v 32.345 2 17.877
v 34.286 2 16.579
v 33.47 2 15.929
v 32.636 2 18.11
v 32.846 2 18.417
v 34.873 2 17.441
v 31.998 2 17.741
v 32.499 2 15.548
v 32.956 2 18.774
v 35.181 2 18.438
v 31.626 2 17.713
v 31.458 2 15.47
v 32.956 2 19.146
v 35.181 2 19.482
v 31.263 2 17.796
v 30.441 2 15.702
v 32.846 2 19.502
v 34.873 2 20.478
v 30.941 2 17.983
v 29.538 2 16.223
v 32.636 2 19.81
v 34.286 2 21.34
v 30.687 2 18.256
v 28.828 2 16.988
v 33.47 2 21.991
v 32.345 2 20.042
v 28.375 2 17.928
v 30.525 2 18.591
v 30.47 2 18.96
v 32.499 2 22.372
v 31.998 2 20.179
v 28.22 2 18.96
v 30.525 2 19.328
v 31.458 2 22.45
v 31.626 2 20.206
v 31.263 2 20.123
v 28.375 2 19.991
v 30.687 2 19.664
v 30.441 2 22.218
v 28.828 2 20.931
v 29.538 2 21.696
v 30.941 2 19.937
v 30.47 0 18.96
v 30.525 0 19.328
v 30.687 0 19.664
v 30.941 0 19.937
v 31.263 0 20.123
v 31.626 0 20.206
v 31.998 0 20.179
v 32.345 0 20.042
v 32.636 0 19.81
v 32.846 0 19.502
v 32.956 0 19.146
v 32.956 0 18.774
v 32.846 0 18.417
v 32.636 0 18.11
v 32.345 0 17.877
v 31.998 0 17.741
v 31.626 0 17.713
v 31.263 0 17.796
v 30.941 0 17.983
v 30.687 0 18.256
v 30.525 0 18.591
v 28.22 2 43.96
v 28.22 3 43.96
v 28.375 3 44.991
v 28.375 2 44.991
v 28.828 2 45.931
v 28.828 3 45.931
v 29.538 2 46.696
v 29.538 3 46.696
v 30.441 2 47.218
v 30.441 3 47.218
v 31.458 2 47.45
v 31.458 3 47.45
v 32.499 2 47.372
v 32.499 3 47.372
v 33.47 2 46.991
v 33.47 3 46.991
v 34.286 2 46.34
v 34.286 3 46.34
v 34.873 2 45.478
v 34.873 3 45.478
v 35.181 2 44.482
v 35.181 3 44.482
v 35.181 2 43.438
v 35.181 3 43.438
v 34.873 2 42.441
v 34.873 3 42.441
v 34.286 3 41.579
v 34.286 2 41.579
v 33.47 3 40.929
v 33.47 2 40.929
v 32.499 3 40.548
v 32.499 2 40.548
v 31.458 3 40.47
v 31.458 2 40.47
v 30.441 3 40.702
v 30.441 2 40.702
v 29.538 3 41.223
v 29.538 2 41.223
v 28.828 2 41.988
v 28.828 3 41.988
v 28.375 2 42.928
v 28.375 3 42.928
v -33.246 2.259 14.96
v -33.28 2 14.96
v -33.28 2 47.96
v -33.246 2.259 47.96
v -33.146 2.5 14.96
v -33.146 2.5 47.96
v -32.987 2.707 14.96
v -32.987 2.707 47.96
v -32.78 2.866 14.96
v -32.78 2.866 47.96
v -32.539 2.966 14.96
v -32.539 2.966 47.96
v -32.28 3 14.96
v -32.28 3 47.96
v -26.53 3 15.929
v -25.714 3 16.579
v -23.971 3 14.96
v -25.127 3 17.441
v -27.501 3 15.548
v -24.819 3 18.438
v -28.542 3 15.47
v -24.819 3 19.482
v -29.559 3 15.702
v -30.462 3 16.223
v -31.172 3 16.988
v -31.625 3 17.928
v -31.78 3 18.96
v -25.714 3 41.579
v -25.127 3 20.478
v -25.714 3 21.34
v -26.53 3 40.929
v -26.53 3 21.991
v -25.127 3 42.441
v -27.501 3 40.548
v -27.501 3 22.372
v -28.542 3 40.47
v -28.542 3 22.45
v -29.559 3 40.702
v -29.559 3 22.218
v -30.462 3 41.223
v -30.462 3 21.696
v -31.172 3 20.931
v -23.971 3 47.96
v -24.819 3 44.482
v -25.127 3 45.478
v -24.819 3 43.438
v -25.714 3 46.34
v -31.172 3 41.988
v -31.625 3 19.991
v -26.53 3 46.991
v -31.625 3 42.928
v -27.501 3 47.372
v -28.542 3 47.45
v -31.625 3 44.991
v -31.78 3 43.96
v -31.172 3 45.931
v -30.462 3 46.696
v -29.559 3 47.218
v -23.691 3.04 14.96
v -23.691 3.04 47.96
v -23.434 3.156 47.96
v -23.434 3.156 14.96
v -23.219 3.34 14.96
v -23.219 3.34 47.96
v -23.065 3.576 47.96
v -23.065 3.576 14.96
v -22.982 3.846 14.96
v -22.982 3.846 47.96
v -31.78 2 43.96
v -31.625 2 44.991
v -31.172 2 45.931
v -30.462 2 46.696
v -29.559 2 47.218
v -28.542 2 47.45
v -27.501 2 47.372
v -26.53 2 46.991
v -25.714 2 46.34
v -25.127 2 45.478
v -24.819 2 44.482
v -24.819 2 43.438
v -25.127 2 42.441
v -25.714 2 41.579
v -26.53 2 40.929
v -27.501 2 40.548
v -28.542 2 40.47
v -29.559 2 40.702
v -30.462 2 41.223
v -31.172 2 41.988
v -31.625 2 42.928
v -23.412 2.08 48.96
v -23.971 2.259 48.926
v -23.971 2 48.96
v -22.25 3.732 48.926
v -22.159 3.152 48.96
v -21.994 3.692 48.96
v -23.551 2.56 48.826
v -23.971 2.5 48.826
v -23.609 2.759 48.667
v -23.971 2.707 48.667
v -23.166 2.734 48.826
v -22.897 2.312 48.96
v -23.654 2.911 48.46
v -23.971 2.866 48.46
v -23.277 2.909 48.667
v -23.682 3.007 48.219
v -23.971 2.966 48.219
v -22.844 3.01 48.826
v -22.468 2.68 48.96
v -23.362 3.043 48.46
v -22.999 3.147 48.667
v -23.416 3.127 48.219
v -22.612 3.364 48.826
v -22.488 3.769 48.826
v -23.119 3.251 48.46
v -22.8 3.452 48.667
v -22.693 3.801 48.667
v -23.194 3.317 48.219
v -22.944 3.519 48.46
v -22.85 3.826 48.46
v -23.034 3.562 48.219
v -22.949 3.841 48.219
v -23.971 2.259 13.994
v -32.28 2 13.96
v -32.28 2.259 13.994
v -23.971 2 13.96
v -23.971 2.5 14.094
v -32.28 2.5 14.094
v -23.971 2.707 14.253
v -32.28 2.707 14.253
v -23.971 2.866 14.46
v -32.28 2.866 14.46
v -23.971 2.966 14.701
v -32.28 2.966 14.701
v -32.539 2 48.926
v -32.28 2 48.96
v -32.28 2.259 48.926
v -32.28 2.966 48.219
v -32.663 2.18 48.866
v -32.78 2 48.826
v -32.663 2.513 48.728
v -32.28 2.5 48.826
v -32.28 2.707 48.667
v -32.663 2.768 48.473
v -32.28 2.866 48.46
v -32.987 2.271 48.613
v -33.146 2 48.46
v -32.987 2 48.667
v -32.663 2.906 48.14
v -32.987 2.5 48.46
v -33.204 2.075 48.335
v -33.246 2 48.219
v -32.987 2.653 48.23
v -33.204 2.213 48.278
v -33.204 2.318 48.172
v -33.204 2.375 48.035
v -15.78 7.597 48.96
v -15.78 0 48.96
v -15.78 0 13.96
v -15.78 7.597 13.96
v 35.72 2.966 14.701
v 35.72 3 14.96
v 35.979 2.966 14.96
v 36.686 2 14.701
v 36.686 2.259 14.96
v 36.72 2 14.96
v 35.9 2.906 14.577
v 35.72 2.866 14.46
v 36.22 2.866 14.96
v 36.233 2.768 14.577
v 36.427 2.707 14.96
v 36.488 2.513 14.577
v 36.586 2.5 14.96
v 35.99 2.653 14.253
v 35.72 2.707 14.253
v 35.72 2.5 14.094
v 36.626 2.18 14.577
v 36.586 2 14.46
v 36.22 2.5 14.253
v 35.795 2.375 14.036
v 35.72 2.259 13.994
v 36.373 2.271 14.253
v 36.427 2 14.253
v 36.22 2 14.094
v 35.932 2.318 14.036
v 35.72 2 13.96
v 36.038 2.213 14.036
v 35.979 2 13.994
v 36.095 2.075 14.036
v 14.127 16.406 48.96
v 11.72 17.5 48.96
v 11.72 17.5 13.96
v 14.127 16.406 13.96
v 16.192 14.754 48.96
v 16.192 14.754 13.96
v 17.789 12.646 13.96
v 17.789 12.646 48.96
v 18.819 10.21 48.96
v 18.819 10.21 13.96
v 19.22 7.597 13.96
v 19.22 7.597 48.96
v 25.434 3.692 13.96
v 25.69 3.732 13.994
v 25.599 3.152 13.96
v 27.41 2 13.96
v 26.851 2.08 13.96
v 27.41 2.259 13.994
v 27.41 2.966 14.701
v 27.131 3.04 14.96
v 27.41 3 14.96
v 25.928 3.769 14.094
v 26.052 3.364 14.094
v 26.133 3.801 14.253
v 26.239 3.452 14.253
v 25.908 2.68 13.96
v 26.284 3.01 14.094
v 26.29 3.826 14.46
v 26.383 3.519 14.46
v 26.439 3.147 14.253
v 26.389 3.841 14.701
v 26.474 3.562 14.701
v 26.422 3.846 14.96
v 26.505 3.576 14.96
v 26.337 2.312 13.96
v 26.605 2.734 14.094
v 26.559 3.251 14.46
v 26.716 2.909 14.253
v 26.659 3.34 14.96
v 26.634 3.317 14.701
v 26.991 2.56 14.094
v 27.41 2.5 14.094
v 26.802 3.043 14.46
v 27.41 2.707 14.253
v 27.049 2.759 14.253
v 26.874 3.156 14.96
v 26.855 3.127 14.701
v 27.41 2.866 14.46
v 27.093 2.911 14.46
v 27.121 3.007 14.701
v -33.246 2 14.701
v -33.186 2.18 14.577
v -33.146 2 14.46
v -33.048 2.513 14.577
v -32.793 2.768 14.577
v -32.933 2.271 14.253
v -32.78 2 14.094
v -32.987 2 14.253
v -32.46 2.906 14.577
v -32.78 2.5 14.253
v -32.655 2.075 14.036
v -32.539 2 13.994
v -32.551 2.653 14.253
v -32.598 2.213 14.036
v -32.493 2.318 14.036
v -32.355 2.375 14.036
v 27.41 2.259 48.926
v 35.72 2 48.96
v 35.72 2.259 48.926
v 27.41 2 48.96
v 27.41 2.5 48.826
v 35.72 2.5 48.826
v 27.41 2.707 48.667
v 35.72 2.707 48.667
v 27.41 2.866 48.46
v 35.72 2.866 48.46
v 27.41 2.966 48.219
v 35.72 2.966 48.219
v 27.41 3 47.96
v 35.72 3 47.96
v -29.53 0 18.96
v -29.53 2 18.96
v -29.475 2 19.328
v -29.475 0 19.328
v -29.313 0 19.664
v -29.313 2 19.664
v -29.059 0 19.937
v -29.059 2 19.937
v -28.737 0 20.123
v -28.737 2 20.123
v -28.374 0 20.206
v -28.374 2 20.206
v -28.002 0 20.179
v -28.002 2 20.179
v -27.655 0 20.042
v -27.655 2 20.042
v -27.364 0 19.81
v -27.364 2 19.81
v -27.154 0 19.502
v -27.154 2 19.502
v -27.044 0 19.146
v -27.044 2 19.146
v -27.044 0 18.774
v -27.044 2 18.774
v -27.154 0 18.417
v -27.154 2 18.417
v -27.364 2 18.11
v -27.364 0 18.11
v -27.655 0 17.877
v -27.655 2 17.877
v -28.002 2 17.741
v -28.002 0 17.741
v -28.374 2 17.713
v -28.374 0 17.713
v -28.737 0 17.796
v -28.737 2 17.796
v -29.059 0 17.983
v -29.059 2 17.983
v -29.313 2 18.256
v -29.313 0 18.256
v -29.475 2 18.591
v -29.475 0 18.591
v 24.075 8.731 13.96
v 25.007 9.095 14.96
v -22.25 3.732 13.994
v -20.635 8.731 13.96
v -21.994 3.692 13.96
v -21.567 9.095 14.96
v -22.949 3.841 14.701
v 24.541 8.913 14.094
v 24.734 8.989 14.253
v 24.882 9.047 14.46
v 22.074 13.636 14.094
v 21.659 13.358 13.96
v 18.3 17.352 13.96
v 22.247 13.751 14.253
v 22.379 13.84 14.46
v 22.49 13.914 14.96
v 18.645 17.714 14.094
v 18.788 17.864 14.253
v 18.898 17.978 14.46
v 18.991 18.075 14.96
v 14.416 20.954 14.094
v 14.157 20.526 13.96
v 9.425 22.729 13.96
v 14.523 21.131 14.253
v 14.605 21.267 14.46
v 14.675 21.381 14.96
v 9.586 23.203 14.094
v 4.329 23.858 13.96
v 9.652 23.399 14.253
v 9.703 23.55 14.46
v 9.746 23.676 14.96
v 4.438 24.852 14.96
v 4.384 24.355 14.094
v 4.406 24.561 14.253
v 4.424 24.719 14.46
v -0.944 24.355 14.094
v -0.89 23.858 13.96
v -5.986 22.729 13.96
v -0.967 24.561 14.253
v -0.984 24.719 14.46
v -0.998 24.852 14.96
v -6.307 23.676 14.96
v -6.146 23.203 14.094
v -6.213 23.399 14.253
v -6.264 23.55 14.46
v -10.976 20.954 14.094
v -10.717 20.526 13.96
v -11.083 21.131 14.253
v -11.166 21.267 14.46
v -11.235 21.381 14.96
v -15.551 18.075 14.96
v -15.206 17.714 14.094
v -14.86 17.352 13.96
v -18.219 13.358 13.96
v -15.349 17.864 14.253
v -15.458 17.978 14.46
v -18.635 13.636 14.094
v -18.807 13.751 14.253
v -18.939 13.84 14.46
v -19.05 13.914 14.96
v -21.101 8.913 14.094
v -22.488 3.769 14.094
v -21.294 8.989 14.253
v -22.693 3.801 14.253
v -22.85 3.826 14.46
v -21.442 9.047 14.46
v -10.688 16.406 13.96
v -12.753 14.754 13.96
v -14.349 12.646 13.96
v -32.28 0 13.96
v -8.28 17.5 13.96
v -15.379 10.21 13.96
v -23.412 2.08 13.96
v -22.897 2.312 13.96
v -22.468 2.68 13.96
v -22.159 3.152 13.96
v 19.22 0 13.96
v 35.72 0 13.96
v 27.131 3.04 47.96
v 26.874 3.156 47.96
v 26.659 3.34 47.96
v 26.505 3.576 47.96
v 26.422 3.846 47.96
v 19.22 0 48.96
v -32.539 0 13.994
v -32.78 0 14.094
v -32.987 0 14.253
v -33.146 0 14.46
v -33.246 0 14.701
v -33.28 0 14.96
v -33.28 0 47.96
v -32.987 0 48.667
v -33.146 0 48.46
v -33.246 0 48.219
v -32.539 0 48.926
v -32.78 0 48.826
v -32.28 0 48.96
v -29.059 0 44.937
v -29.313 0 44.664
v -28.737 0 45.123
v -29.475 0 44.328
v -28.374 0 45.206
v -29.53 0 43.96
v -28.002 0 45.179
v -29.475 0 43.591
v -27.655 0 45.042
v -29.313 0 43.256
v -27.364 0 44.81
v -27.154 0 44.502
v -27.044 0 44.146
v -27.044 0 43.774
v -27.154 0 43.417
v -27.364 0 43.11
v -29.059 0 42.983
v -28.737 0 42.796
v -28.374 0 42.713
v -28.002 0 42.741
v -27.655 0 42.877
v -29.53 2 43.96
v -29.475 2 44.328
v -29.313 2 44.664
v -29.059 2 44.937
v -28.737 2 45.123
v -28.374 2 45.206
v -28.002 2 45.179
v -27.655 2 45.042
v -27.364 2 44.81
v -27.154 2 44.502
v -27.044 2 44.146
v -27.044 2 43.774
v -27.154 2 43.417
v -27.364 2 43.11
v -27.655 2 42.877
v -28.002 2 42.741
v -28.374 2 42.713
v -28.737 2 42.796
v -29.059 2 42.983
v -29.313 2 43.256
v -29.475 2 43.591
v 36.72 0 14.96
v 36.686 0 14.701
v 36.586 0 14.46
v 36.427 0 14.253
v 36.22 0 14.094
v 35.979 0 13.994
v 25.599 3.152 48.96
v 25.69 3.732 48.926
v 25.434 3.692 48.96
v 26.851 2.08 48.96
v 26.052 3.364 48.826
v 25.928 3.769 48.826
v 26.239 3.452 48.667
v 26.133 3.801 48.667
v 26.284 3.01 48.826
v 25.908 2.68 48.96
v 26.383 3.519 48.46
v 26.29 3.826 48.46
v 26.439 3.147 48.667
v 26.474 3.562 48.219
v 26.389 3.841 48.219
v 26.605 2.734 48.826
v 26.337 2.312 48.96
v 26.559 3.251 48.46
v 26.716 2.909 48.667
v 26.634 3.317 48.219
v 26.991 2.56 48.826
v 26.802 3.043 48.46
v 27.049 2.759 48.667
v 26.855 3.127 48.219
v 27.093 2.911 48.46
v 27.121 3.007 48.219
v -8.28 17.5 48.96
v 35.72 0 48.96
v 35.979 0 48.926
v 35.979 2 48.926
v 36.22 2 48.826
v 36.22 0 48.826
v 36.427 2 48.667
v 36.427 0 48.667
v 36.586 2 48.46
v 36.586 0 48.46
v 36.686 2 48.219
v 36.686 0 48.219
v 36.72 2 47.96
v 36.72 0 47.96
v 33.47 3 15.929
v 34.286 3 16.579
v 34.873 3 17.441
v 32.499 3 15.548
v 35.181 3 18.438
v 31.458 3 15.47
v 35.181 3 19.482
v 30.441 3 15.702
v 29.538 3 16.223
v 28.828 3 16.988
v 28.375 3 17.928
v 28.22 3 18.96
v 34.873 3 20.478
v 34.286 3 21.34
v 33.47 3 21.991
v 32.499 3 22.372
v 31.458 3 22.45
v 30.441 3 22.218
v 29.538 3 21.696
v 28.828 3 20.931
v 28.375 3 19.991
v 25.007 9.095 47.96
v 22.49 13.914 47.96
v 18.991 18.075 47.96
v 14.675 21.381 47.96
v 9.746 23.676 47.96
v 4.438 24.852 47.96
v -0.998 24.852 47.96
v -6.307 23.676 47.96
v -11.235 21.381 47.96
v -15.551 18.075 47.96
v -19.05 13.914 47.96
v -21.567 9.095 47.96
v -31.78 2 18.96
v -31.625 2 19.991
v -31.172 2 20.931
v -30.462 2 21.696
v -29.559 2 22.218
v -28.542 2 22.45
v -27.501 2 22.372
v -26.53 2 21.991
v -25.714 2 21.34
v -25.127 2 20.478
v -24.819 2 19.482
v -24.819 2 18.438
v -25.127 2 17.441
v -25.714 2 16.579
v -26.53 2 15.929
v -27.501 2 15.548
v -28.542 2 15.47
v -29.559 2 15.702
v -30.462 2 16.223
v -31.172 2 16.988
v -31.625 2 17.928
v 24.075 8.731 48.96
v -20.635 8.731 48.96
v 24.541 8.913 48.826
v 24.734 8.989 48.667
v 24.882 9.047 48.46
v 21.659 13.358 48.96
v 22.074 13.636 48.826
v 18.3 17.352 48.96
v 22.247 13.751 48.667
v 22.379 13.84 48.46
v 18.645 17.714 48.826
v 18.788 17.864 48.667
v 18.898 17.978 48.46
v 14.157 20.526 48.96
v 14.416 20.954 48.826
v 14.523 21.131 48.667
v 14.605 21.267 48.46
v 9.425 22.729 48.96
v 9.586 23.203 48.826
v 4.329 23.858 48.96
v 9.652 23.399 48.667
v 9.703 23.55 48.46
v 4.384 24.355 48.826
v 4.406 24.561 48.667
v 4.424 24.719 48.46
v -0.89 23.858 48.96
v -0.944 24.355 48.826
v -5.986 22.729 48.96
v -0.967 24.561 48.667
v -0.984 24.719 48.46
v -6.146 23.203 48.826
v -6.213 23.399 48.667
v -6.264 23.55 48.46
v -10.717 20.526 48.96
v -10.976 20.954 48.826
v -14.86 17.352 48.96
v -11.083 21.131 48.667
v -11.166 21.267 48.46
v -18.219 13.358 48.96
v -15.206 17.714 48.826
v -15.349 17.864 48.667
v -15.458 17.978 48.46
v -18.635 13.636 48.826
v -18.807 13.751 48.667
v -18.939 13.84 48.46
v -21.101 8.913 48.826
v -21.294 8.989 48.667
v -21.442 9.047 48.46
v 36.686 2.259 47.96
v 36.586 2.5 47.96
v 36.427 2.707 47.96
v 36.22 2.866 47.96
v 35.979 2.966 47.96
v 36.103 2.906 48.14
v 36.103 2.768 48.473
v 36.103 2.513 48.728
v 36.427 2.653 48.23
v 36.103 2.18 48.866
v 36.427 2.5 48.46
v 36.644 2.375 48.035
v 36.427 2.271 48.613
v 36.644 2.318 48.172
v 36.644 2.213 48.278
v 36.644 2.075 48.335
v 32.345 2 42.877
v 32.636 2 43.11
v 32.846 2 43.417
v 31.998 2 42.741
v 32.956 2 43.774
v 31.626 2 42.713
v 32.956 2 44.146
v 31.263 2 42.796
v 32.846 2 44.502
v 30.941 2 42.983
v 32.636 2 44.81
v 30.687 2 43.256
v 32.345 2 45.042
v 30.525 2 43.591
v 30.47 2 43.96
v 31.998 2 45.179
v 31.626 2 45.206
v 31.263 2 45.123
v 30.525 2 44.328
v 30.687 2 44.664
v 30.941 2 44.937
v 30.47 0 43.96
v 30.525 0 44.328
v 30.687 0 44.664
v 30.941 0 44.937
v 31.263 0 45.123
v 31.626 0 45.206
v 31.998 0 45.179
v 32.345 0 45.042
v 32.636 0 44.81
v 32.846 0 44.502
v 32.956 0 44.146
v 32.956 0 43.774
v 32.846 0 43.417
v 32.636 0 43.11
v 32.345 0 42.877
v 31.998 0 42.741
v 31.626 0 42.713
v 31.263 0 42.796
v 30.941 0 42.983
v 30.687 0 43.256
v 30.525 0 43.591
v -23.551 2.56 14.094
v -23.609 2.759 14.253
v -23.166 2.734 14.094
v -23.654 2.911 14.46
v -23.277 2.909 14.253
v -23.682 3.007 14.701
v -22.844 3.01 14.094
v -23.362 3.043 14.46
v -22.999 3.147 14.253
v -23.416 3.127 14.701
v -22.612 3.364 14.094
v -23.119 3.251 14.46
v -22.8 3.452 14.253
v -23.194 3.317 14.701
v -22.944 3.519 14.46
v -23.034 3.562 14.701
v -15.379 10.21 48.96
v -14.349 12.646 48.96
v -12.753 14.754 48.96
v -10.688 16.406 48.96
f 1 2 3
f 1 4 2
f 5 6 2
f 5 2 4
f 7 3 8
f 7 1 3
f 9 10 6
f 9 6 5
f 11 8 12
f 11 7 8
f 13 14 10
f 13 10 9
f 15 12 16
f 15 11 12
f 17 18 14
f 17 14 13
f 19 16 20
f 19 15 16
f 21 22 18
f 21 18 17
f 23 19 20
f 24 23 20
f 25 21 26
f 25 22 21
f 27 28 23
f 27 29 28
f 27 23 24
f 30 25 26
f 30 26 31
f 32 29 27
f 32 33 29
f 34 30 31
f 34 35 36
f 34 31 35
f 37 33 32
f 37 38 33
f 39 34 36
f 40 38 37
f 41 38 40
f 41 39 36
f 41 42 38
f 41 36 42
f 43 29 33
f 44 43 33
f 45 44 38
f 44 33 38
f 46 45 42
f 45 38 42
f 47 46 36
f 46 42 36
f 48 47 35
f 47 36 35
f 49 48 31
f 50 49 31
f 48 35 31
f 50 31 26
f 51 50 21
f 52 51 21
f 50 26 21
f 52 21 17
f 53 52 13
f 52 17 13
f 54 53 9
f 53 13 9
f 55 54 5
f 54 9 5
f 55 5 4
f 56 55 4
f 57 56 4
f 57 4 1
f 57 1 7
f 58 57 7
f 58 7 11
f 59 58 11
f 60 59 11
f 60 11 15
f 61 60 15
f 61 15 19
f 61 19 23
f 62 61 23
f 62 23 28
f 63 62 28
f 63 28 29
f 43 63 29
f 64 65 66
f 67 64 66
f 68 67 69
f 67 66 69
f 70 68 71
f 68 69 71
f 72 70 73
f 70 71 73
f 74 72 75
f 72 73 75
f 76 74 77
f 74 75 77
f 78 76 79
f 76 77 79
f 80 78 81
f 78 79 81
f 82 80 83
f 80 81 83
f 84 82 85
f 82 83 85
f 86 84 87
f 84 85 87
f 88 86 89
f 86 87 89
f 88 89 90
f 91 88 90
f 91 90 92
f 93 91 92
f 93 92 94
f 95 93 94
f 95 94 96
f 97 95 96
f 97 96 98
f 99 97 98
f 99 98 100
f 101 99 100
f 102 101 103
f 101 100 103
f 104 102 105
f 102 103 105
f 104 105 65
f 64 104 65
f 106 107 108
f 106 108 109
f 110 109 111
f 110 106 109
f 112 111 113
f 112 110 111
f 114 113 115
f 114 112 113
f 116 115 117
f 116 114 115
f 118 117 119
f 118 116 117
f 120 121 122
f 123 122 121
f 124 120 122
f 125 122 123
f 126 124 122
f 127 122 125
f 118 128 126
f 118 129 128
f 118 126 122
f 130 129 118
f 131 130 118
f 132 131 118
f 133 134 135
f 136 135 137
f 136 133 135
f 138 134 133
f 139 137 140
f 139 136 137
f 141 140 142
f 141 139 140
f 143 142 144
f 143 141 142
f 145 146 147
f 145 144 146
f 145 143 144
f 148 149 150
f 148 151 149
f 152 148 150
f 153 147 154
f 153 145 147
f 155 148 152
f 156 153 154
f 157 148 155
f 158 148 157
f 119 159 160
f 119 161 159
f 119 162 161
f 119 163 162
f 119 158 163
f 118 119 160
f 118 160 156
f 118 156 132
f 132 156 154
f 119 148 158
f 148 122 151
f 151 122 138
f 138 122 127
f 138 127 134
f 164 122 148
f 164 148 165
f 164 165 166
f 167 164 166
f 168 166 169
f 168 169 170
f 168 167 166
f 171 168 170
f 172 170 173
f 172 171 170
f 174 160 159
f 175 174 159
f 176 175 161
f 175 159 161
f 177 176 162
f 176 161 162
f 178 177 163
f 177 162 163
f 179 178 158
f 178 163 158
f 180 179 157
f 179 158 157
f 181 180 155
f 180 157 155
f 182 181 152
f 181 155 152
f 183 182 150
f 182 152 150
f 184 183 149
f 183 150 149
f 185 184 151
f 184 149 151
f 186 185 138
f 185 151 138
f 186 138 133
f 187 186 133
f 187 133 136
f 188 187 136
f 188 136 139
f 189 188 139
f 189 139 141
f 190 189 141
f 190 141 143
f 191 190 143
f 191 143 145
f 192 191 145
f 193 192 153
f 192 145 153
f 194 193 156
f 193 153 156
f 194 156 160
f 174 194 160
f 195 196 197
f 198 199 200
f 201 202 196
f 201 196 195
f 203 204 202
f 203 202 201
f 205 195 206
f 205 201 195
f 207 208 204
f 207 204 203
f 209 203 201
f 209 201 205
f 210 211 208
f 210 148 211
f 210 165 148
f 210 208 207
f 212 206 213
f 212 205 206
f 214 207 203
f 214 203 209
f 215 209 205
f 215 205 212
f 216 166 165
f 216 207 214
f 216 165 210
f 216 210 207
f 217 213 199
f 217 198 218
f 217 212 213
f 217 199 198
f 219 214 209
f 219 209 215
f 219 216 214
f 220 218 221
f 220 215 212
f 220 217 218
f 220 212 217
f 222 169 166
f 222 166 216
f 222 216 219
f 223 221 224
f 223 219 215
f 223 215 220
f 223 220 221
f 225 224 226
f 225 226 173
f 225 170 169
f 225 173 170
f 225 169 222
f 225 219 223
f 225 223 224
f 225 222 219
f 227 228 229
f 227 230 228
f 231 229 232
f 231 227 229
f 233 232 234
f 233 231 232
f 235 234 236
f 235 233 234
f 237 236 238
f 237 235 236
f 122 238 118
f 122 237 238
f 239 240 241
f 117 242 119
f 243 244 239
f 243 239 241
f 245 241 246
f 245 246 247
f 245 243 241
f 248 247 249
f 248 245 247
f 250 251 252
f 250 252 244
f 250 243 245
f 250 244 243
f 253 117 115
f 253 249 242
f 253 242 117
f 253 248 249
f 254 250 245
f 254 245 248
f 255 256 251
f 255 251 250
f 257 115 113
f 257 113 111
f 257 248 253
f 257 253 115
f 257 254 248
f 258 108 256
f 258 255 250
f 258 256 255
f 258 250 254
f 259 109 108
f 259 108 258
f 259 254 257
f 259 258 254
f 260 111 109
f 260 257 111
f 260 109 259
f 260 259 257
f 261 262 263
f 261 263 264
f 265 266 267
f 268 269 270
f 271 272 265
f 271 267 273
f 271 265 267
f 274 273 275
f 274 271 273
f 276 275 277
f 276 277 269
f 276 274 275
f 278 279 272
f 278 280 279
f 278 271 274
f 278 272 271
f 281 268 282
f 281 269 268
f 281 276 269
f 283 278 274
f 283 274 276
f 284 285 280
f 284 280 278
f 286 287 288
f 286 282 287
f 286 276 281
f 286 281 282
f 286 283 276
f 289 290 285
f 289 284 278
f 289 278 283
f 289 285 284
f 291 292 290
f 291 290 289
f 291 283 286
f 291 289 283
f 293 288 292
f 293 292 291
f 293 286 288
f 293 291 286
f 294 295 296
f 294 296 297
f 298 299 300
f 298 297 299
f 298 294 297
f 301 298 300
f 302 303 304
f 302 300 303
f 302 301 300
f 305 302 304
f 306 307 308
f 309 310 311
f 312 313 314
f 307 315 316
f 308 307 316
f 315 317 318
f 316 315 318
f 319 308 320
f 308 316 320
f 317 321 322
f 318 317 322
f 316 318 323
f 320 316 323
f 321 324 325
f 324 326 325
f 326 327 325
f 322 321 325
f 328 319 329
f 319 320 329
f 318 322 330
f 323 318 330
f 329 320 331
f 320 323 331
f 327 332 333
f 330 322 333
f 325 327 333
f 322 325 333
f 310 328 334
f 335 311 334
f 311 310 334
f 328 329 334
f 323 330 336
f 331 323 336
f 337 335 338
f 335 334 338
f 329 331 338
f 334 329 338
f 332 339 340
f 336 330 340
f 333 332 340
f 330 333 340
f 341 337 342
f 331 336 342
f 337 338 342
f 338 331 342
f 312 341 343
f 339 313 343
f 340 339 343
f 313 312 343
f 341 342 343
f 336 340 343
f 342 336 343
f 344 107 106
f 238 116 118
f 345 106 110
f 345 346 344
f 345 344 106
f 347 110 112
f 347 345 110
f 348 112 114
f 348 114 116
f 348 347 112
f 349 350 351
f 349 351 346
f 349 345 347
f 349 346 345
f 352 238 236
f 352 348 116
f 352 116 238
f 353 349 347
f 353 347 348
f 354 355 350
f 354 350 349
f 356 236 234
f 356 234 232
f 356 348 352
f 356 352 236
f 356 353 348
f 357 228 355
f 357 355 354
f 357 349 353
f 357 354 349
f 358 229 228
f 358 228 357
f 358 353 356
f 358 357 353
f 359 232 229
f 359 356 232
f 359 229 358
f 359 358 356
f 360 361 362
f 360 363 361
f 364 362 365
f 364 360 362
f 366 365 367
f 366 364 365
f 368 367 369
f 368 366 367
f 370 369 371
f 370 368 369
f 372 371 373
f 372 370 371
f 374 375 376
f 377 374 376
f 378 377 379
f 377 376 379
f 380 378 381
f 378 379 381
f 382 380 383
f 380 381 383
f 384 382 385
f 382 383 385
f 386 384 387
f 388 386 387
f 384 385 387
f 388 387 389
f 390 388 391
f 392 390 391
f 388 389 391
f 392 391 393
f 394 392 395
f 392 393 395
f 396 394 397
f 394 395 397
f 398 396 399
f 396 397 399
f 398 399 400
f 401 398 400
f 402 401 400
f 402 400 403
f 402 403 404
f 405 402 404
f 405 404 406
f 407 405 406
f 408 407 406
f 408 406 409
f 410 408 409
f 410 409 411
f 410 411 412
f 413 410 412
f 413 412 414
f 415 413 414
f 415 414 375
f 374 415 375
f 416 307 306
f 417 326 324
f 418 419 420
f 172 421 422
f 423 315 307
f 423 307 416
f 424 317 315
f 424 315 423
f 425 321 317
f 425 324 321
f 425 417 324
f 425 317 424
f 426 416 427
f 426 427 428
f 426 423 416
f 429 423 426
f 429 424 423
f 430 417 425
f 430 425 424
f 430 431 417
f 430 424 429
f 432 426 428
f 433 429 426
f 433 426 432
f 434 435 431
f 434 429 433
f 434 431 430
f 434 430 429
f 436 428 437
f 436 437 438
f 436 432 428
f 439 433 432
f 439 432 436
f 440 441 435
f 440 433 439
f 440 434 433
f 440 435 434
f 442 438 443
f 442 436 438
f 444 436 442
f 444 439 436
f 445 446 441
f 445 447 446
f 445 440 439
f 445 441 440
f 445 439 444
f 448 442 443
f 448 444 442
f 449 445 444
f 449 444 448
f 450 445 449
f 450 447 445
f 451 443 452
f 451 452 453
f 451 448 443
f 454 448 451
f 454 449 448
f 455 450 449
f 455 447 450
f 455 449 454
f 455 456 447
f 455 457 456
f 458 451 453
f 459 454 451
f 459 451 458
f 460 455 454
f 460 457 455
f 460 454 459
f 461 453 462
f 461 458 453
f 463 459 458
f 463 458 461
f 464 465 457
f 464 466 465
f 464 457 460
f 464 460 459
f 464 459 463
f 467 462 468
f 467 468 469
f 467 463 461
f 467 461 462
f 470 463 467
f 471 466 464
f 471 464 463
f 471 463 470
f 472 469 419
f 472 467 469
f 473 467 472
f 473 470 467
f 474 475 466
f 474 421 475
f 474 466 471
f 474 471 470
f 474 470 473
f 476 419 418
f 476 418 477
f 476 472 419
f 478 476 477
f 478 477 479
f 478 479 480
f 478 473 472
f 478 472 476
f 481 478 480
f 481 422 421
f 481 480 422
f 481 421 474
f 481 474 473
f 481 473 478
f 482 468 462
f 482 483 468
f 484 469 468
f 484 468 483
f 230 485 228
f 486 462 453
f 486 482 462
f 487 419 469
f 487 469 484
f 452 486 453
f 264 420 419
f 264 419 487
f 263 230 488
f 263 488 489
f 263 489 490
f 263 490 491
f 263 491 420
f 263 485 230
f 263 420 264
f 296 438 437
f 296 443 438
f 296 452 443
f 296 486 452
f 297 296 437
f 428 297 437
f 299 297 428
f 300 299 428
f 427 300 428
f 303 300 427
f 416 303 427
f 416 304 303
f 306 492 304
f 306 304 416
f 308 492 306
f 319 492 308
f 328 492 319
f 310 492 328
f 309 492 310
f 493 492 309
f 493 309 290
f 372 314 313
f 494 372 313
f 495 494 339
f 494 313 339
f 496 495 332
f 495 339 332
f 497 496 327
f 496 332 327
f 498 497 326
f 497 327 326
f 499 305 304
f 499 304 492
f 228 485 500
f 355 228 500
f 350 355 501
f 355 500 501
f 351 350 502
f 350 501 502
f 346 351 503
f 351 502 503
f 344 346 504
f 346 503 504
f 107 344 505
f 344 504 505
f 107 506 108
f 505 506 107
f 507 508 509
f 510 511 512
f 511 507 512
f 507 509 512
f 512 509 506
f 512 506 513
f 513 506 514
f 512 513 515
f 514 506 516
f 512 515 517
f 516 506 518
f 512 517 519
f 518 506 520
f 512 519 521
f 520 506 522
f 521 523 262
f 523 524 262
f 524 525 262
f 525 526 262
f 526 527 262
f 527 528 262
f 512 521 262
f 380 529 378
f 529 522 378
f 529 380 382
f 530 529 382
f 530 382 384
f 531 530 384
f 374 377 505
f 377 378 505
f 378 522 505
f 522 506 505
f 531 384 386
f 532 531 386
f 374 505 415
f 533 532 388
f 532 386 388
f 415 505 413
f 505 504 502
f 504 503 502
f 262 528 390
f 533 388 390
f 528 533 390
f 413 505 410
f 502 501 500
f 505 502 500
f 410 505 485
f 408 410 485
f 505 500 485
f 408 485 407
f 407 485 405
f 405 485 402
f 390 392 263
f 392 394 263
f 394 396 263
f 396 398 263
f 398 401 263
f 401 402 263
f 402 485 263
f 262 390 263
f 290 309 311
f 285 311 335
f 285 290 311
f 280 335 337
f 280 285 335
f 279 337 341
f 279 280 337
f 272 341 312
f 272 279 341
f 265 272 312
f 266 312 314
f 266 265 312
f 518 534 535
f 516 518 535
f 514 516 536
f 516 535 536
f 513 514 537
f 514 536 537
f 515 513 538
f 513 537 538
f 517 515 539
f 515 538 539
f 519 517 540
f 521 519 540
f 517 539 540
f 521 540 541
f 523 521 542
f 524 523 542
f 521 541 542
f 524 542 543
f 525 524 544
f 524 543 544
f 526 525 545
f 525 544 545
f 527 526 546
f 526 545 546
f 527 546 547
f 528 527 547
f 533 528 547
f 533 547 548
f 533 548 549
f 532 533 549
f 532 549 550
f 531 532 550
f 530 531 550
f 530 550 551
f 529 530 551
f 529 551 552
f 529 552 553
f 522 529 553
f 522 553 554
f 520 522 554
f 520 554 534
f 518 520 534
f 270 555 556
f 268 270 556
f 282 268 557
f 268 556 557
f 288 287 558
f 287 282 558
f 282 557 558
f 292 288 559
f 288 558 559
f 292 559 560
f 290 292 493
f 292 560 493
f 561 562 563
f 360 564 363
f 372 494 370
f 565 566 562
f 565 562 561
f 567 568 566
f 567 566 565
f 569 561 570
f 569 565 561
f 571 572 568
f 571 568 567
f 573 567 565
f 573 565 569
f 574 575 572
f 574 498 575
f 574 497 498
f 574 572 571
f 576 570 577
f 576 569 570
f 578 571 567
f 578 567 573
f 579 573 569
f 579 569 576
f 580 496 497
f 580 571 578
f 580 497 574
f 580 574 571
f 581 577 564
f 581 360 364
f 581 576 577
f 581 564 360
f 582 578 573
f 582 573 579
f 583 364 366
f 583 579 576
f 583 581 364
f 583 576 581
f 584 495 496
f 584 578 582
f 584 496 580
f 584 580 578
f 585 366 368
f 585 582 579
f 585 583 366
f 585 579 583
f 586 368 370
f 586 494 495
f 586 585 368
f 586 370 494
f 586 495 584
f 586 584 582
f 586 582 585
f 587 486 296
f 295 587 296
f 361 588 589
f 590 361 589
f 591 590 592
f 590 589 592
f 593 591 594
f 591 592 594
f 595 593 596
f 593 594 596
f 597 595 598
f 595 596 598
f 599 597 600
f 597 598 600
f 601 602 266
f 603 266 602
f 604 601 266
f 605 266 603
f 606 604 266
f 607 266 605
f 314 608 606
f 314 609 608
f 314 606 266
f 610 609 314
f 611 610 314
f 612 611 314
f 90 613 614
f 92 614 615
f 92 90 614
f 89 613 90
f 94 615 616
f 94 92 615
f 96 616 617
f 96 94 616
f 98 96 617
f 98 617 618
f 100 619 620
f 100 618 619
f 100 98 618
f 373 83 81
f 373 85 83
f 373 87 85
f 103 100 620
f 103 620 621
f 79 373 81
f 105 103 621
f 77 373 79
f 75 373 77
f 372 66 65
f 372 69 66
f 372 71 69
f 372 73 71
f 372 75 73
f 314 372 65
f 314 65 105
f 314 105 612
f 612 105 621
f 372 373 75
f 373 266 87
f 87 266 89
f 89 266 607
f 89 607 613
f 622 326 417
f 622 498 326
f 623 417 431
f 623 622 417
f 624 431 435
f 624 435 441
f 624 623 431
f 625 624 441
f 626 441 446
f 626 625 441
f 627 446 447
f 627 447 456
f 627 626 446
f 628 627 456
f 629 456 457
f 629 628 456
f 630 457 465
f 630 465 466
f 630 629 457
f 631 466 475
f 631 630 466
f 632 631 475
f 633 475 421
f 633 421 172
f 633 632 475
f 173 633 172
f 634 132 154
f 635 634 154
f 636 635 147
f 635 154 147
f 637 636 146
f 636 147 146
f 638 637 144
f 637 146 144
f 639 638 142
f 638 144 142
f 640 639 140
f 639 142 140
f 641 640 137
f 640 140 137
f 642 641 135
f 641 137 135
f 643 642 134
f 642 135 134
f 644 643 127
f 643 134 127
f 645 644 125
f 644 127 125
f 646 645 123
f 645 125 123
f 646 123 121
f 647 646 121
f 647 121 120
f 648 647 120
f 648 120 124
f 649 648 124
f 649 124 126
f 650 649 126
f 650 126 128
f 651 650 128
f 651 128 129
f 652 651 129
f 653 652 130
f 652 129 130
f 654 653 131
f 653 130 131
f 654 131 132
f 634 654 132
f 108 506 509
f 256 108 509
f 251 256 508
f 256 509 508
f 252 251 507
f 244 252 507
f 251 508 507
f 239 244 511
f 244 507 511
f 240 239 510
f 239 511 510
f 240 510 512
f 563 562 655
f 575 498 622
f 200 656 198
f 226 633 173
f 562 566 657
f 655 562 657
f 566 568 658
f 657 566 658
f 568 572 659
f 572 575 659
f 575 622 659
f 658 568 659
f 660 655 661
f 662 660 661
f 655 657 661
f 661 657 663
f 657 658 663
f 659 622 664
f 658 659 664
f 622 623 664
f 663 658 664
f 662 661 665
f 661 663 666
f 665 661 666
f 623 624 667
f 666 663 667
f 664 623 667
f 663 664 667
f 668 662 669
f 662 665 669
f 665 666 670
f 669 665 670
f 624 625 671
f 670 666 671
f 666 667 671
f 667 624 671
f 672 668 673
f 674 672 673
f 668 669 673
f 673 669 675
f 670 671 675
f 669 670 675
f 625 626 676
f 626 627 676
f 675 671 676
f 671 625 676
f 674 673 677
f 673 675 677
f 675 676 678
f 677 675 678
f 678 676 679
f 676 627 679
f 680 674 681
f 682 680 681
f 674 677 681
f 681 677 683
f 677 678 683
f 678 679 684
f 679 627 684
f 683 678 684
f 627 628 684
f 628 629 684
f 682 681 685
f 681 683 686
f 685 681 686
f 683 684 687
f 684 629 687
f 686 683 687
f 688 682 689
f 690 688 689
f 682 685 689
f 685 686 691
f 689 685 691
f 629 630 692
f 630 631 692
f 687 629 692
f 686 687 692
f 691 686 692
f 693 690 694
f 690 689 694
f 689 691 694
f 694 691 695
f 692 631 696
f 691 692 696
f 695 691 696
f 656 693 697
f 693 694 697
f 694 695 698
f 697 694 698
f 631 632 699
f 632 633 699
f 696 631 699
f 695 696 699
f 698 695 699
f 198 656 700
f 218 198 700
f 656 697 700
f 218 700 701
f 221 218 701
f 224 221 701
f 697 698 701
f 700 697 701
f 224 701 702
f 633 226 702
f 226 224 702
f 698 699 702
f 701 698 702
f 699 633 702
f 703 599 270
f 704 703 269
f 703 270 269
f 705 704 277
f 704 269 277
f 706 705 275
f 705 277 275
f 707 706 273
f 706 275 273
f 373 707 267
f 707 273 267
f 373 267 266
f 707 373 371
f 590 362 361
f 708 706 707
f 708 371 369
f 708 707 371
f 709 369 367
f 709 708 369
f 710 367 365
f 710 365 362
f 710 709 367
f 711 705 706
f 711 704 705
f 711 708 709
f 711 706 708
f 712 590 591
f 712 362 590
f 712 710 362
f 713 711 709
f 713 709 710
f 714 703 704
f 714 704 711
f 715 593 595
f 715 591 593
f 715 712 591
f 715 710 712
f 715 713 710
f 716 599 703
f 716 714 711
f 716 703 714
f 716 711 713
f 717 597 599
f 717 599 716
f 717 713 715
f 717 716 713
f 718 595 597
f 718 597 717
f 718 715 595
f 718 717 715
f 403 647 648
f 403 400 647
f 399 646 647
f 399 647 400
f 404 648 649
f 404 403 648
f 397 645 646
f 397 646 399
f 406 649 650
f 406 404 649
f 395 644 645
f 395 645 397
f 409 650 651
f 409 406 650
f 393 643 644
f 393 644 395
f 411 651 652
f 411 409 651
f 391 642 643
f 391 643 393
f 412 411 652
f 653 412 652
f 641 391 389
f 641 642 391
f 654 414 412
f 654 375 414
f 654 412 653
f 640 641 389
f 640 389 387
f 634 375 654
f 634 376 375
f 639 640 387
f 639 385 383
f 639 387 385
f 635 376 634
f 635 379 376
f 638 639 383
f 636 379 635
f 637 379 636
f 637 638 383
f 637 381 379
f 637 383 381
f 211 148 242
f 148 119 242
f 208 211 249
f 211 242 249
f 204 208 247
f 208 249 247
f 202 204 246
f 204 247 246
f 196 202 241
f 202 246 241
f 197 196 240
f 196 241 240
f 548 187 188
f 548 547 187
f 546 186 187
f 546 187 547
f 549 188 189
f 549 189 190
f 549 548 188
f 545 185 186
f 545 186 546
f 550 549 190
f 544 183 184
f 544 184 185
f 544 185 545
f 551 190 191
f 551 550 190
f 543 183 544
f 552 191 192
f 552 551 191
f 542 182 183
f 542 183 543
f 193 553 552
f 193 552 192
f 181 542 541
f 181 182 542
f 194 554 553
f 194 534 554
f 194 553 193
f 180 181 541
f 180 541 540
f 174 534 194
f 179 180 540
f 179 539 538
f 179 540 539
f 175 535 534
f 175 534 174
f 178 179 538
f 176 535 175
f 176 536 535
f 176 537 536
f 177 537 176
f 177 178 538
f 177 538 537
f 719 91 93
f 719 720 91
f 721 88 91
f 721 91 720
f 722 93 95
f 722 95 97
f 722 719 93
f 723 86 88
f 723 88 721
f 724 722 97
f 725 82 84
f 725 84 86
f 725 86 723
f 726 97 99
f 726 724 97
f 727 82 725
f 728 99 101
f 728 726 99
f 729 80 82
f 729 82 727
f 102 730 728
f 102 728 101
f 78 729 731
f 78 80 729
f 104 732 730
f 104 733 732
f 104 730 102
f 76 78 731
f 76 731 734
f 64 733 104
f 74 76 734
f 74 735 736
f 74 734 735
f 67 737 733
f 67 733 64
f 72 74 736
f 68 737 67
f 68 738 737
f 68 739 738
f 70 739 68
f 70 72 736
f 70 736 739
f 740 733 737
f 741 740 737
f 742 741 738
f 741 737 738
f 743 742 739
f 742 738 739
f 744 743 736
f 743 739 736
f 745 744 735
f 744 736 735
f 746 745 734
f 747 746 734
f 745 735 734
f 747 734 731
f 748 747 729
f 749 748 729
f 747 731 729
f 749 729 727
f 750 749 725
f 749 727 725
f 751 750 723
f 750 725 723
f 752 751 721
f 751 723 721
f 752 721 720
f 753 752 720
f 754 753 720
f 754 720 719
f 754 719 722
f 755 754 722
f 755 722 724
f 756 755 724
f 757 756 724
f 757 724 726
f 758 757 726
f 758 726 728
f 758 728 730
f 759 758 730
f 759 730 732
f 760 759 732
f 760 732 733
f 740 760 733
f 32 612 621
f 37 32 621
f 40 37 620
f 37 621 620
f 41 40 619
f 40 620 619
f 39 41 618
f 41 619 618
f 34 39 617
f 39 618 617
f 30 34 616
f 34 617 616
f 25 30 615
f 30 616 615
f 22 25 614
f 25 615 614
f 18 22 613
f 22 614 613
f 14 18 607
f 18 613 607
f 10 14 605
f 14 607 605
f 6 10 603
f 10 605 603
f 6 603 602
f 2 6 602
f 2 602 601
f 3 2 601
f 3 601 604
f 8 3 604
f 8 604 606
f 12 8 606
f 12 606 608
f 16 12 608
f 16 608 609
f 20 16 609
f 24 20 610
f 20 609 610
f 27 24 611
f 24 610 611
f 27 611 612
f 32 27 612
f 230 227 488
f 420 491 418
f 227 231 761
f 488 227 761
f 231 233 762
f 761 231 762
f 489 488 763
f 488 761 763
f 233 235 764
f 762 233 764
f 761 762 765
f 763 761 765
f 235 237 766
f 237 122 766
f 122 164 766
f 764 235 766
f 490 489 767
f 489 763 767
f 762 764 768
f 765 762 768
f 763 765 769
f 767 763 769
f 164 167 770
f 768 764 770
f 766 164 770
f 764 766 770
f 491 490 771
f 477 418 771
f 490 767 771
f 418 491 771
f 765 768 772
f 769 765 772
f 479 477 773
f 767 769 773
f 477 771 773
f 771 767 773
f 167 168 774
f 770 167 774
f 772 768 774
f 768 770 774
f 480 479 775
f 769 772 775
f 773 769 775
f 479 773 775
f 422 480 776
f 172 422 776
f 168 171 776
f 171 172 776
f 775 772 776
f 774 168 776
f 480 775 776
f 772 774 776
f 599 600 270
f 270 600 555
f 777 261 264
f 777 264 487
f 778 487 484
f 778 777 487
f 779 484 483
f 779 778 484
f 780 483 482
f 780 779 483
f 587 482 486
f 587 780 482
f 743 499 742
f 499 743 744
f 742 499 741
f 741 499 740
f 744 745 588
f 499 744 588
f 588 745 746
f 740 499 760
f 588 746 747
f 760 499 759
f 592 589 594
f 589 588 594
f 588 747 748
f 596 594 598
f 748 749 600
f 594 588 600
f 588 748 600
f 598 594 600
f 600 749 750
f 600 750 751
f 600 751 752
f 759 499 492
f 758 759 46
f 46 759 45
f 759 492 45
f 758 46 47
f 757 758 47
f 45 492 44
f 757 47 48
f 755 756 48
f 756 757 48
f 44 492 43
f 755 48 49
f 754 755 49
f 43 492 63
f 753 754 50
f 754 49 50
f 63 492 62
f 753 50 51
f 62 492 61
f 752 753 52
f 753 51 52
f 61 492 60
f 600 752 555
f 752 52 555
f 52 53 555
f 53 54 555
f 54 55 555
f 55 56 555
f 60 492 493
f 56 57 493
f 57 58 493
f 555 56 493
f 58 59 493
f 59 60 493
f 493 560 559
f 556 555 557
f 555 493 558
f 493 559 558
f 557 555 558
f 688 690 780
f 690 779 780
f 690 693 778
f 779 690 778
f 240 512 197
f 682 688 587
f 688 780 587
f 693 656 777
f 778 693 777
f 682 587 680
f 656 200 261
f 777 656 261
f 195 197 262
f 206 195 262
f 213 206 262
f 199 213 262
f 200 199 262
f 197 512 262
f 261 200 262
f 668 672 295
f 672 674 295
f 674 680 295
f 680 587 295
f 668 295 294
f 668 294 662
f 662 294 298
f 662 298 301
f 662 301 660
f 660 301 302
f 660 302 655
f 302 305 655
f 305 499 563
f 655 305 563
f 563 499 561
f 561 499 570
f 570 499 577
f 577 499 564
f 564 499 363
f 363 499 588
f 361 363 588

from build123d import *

# Parameters (mm, degrees)
CROQUIS1_W              = 70
CROQUIS1_H              = 35
SALIENTE_EXTRUIR1_DEPTH = 30
CORTAR_EXTRUIR1_DEPTH   = 310
CORTAR_EXTRUIR2_DEPTH   = 310
CROQUIS4_R              = 3.5
CORTAR_EXTRUIR3_DEPTH   = 1
REDONDEO1_R             = 1
REDONDEO2_R             = 1
CROQUIS5_R              = 1.25
CORTAR_EXTRUIR4_DEPTH   = 10


with BuildPart() as part:
    # Croquis1 → Saliente-Extruir1 (new body)
    with BuildSketch(Plane(origin=(0, 0, 0), x_dir=(1, 0, 0), z_dir=(0, 1, 0))):
        with Locations((1.719890136, -31.459853515)):
            Rectangle(CROQUIS1_W, CROQUIS1_H)
    extrude(amount=SALIENTE_EXTRUIR1_DEPTH)

    # Croquis2 → Cortar-Extruir1 (cut)
    with BuildSketch(Plane.XY.offset(48.959853515)):
        with BuildLine():
            Line((-15.780109864, 0), (-15.780109864, 7.596564782))
            ThreePointArc((-15.780109864, 7.596564782), (-13.616336365, 13.749552304), (-8.280109864, 17.5))
            Line((-8.280109864, 17.5), (11.719890136, 17.5))
            ThreePointArc((11.719890136, 17.5), (17.0561195, 13.749554472), (19.219890136, 7.596564782))
            Line((19.219890136, 7.596564782), (19.219890136, 0))
            ThreePointArc((19.219890136, 0), (1.719890136, -17.5), (-15.780109864, 0))
        make_face()
    extrude(amount=-CORTAR_EXTRUIR1_DEPTH, mode=Mode.SUBTRACT)

    # Croquis3 → Cortar-Extruir2 (cut)
    with BuildSketch(Plane.XY.offset(48.959853515)):
        with BuildLine():
            Line((-33.280109864, 30), (36.719890136, 30))
            Line((36.719890136, 30), (36.719890136, 3))
            Line((36.719890136, 3), (26.539237428, 3))
            ThreePointArc((26.539237428, 3), (1.719890136, 25), (-23.099457156, 3))
            Line((-23.099457156, 3), (-33.280109864, 3))
            Line((-33.280109864, 3), (-33.280109864, 30))
        make_face()
    extrude(amount=-CORTAR_EXTRUIR2_DEPTH, mode=Mode.SUBTRACT)

    # Croquis4 → Cortar-Extruir3 (cut)
    with BuildSketch(Plane(origin=(0, 3, 0), x_dir=(1, 0, 0), z_dir=(0, 1, 0))):
        with Locations(Location((-28.280109864, -18.959853515, 0), (0, 0, 180))):
            Circle(CROQUIS4_R)
        with Locations(Location((-28.280109864, -43.959853515, 0), (0, 0, 180))):
            Circle(CROQUIS4_R)
        with Locations(Location((31.719890136, -18.959853515, 0), (0, 0, 180))):
            Circle(CROQUIS4_R)
        with Locations(Location((31.719890136, -43.959853515, 0), (0, 0, 180))):
            Circle(CROQUIS4_R)
    extrude(amount=-CORTAR_EXTRUIR3_DEPTH, mode=Mode.SUBTRACT)

    # Redondeo1
    redondeo1_edges = [part.edges().sort_by_distance(p)[0] for p in [
        (-28.18978351, 3, 13.959853515),
        (1.719890136, 25, 13.959853515),
        (31.629563782, 3, 13.959853515),
        (36.719890136, 3, 31.459853515),
        (26.539237428, 3, 31.459853515),
        (-23.099457156, 3, 31.459853515),
        (-33.280109864, 3, 31.459853515),
        (-28.18978351, 3, 48.959853515),
        (1.719890136, 25, 48.959853515),
        (31.629563782, 3, 48.959853515),
    ]]
    fillet(redondeo1_edges, radius=REDONDEO1_R)

    # Redondeo2
    # the kernel refuses this fillet: 1 mm, written as the material it takes off along each edge
    with BuildSketch(Plane(origin=(-32.280109864, 2, 14.959853515), x_dir=(-1, 0, 0), z_dir=(0, 0, -1))) as redondeo2_piece_1_section:
        Polygon((0, 0), (REDONDEO2_R, 0), (REDONDEO2_R, REDONDEO2_R), (0, REDONDEO2_R), align=None)
    redondeo2_piece_1 = extrude(amount=REDONDEO2_R, mode=Mode.PRIVATE)
    redondeo2_piece_1 = redondeo2_piece_1 - Plane(origin=(-32.280109864, 2, 14.959853515), x_dir=(0.7071067811865475, -0.7071067811865475, 0), z_dir=(0, 0, -1)) * Sphere(REDONDEO2_R, mode=Mode.PRIVATE)
    add(redondeo2_piece_1, mode=Mode.SUBTRACT)
    with BuildSketch(Plane(origin=(35.719890136, 2, 14.959853515), x_dir=(1, 0, 0), z_dir=(0, 0, -1))) as redondeo2_piece_2_section:
        Polygon((0, 0), (REDONDEO2_R, 0), (REDONDEO2_R, -REDONDEO2_R), (0, -REDONDEO2_R), align=None)
    redondeo2_piece_2 = extrude(amount=REDONDEO2_R, mode=Mode.PRIVATE)
    redondeo2_piece_2 = redondeo2_piece_2 - Plane(origin=(35.719890136, 2, 14.959853515), x_dir=(-0.7071067811865475, -0.7071067811865475, 0), z_dir=(0, 0, -1)) * Sphere(REDONDEO2_R, mode=Mode.PRIVATE)
    add(redondeo2_piece_2, mode=Mode.SUBTRACT)
    with BuildSketch(Plane(origin=(-32.280109864, 2, 47.959853515), x_dir=(0, 0, 1), z_dir=(-1, 0, 0))) as redondeo2_piece_3_section:
        Polygon((0, 0), (REDONDEO2_R, 0), (REDONDEO2_R, REDONDEO2_R), (0, REDONDEO2_R), align=None)
    redondeo2_piece_3 = extrude(amount=REDONDEO2_R, mode=Mode.PRIVATE)
    redondeo2_piece_3 = redondeo2_piece_3 - Plane(origin=(-32.280109864, 2, 47.959853515), x_dir=(0, -0.7071067811865475, -0.7071067811865475), z_dir=(-1, 0, 0)) * Sphere(REDONDEO2_R, mode=Mode.PRIVATE)
    add(redondeo2_piece_3, mode=Mode.SUBTRACT)
    with BuildSketch(Plane(origin=(35.719890136, 2, 47.959853515), x_dir=(0, 0, 1), z_dir=(1, 0, 0))) as redondeo2_piece_4_section:
        Polygon((0, 0), (REDONDEO2_R, 0), (REDONDEO2_R, -REDONDEO2_R), (0, -REDONDEO2_R), align=None)
    redondeo2_piece_4 = extrude(amount=REDONDEO2_R, mode=Mode.PRIVATE)
    redondeo2_piece_4 = redondeo2_piece_4 - Plane(origin=(35.719890136, 2, 47.959853515), x_dir=(0, -0.7071067811865475, -0.7071067811865475), z_dir=(1, 0, 0)) * Sphere(REDONDEO2_R, mode=Mode.PRIVATE)
    add(redondeo2_piece_4, mode=Mode.SUBTRACT)
    with BuildSketch(Plane(origin=(36.719890136, -2.5, 48.959853515), x_dir=(0, 0, -1), z_dir=(0, 1, 0)), Plane(origin=(36.719890136, -2.5, 13.959853515), x_dir=(-1, 0, 0), z_dir=(0, 1, 0))) as redondeo2_piece_5:
        with BuildLine():
            CenterArc((REDONDEO2_R, REDONDEO2_R), REDONDEO2_R, 180, 90)
            Line((0, REDONDEO2_R), (0, 0))
            Line((0, 0), (REDONDEO2_R, 0))
        make_face()
    extrude(amount=4.5, mode=Mode.SUBTRACT)
    with BuildSketch(Plane(origin=(-33.280109864, -2.5, 48.959853515), x_dir=(0, 0, -1), z_dir=(0, 1, 0)), Plane(origin=(-33.280109864, -2.5, 13.959853515), x_dir=(1, 0, 0), z_dir=(0, 1, 0))) as redondeo2_piece_6:
        with BuildLine():
            CenterArc((REDONDEO2_R, -REDONDEO2_R), REDONDEO2_R, 90, 90)
            Line((0, -REDONDEO2_R), (0, 0))
            Line((0, 0), (REDONDEO2_R, 0))
        make_face()
    extrude(amount=4.5, mode=Mode.SUBTRACT)

    # Croquis5 → Cortar-Extruir4 (cut)
    with BuildSketch(Plane(origin=(0, 2, 0), x_dir=(1, 0, 0), z_dir=(0, 1, 0))):
        with Locations(Location((-28.280109864, -18.959853515, 0), (0, 0, 180))):
            Circle(CROQUIS5_R)
        with Locations(Location((31.719890136, -18.959853515, 0), (0, 0, 180))):
            Circle(CROQUIS5_R)
        with Locations(Location((31.719890136, -43.959853515, 0), (0, 0, 180))):
            Circle(CROQUIS5_R)
        with Locations(Location((-28.280109864, -43.959853515, 0), (0, 0, 180))):
            Circle(CROQUIS5_R)
    extrude(amount=-CORTAR_EXTRUIR4_DEPTH, mode=Mode.SUBTRACT)


solid = part.part
